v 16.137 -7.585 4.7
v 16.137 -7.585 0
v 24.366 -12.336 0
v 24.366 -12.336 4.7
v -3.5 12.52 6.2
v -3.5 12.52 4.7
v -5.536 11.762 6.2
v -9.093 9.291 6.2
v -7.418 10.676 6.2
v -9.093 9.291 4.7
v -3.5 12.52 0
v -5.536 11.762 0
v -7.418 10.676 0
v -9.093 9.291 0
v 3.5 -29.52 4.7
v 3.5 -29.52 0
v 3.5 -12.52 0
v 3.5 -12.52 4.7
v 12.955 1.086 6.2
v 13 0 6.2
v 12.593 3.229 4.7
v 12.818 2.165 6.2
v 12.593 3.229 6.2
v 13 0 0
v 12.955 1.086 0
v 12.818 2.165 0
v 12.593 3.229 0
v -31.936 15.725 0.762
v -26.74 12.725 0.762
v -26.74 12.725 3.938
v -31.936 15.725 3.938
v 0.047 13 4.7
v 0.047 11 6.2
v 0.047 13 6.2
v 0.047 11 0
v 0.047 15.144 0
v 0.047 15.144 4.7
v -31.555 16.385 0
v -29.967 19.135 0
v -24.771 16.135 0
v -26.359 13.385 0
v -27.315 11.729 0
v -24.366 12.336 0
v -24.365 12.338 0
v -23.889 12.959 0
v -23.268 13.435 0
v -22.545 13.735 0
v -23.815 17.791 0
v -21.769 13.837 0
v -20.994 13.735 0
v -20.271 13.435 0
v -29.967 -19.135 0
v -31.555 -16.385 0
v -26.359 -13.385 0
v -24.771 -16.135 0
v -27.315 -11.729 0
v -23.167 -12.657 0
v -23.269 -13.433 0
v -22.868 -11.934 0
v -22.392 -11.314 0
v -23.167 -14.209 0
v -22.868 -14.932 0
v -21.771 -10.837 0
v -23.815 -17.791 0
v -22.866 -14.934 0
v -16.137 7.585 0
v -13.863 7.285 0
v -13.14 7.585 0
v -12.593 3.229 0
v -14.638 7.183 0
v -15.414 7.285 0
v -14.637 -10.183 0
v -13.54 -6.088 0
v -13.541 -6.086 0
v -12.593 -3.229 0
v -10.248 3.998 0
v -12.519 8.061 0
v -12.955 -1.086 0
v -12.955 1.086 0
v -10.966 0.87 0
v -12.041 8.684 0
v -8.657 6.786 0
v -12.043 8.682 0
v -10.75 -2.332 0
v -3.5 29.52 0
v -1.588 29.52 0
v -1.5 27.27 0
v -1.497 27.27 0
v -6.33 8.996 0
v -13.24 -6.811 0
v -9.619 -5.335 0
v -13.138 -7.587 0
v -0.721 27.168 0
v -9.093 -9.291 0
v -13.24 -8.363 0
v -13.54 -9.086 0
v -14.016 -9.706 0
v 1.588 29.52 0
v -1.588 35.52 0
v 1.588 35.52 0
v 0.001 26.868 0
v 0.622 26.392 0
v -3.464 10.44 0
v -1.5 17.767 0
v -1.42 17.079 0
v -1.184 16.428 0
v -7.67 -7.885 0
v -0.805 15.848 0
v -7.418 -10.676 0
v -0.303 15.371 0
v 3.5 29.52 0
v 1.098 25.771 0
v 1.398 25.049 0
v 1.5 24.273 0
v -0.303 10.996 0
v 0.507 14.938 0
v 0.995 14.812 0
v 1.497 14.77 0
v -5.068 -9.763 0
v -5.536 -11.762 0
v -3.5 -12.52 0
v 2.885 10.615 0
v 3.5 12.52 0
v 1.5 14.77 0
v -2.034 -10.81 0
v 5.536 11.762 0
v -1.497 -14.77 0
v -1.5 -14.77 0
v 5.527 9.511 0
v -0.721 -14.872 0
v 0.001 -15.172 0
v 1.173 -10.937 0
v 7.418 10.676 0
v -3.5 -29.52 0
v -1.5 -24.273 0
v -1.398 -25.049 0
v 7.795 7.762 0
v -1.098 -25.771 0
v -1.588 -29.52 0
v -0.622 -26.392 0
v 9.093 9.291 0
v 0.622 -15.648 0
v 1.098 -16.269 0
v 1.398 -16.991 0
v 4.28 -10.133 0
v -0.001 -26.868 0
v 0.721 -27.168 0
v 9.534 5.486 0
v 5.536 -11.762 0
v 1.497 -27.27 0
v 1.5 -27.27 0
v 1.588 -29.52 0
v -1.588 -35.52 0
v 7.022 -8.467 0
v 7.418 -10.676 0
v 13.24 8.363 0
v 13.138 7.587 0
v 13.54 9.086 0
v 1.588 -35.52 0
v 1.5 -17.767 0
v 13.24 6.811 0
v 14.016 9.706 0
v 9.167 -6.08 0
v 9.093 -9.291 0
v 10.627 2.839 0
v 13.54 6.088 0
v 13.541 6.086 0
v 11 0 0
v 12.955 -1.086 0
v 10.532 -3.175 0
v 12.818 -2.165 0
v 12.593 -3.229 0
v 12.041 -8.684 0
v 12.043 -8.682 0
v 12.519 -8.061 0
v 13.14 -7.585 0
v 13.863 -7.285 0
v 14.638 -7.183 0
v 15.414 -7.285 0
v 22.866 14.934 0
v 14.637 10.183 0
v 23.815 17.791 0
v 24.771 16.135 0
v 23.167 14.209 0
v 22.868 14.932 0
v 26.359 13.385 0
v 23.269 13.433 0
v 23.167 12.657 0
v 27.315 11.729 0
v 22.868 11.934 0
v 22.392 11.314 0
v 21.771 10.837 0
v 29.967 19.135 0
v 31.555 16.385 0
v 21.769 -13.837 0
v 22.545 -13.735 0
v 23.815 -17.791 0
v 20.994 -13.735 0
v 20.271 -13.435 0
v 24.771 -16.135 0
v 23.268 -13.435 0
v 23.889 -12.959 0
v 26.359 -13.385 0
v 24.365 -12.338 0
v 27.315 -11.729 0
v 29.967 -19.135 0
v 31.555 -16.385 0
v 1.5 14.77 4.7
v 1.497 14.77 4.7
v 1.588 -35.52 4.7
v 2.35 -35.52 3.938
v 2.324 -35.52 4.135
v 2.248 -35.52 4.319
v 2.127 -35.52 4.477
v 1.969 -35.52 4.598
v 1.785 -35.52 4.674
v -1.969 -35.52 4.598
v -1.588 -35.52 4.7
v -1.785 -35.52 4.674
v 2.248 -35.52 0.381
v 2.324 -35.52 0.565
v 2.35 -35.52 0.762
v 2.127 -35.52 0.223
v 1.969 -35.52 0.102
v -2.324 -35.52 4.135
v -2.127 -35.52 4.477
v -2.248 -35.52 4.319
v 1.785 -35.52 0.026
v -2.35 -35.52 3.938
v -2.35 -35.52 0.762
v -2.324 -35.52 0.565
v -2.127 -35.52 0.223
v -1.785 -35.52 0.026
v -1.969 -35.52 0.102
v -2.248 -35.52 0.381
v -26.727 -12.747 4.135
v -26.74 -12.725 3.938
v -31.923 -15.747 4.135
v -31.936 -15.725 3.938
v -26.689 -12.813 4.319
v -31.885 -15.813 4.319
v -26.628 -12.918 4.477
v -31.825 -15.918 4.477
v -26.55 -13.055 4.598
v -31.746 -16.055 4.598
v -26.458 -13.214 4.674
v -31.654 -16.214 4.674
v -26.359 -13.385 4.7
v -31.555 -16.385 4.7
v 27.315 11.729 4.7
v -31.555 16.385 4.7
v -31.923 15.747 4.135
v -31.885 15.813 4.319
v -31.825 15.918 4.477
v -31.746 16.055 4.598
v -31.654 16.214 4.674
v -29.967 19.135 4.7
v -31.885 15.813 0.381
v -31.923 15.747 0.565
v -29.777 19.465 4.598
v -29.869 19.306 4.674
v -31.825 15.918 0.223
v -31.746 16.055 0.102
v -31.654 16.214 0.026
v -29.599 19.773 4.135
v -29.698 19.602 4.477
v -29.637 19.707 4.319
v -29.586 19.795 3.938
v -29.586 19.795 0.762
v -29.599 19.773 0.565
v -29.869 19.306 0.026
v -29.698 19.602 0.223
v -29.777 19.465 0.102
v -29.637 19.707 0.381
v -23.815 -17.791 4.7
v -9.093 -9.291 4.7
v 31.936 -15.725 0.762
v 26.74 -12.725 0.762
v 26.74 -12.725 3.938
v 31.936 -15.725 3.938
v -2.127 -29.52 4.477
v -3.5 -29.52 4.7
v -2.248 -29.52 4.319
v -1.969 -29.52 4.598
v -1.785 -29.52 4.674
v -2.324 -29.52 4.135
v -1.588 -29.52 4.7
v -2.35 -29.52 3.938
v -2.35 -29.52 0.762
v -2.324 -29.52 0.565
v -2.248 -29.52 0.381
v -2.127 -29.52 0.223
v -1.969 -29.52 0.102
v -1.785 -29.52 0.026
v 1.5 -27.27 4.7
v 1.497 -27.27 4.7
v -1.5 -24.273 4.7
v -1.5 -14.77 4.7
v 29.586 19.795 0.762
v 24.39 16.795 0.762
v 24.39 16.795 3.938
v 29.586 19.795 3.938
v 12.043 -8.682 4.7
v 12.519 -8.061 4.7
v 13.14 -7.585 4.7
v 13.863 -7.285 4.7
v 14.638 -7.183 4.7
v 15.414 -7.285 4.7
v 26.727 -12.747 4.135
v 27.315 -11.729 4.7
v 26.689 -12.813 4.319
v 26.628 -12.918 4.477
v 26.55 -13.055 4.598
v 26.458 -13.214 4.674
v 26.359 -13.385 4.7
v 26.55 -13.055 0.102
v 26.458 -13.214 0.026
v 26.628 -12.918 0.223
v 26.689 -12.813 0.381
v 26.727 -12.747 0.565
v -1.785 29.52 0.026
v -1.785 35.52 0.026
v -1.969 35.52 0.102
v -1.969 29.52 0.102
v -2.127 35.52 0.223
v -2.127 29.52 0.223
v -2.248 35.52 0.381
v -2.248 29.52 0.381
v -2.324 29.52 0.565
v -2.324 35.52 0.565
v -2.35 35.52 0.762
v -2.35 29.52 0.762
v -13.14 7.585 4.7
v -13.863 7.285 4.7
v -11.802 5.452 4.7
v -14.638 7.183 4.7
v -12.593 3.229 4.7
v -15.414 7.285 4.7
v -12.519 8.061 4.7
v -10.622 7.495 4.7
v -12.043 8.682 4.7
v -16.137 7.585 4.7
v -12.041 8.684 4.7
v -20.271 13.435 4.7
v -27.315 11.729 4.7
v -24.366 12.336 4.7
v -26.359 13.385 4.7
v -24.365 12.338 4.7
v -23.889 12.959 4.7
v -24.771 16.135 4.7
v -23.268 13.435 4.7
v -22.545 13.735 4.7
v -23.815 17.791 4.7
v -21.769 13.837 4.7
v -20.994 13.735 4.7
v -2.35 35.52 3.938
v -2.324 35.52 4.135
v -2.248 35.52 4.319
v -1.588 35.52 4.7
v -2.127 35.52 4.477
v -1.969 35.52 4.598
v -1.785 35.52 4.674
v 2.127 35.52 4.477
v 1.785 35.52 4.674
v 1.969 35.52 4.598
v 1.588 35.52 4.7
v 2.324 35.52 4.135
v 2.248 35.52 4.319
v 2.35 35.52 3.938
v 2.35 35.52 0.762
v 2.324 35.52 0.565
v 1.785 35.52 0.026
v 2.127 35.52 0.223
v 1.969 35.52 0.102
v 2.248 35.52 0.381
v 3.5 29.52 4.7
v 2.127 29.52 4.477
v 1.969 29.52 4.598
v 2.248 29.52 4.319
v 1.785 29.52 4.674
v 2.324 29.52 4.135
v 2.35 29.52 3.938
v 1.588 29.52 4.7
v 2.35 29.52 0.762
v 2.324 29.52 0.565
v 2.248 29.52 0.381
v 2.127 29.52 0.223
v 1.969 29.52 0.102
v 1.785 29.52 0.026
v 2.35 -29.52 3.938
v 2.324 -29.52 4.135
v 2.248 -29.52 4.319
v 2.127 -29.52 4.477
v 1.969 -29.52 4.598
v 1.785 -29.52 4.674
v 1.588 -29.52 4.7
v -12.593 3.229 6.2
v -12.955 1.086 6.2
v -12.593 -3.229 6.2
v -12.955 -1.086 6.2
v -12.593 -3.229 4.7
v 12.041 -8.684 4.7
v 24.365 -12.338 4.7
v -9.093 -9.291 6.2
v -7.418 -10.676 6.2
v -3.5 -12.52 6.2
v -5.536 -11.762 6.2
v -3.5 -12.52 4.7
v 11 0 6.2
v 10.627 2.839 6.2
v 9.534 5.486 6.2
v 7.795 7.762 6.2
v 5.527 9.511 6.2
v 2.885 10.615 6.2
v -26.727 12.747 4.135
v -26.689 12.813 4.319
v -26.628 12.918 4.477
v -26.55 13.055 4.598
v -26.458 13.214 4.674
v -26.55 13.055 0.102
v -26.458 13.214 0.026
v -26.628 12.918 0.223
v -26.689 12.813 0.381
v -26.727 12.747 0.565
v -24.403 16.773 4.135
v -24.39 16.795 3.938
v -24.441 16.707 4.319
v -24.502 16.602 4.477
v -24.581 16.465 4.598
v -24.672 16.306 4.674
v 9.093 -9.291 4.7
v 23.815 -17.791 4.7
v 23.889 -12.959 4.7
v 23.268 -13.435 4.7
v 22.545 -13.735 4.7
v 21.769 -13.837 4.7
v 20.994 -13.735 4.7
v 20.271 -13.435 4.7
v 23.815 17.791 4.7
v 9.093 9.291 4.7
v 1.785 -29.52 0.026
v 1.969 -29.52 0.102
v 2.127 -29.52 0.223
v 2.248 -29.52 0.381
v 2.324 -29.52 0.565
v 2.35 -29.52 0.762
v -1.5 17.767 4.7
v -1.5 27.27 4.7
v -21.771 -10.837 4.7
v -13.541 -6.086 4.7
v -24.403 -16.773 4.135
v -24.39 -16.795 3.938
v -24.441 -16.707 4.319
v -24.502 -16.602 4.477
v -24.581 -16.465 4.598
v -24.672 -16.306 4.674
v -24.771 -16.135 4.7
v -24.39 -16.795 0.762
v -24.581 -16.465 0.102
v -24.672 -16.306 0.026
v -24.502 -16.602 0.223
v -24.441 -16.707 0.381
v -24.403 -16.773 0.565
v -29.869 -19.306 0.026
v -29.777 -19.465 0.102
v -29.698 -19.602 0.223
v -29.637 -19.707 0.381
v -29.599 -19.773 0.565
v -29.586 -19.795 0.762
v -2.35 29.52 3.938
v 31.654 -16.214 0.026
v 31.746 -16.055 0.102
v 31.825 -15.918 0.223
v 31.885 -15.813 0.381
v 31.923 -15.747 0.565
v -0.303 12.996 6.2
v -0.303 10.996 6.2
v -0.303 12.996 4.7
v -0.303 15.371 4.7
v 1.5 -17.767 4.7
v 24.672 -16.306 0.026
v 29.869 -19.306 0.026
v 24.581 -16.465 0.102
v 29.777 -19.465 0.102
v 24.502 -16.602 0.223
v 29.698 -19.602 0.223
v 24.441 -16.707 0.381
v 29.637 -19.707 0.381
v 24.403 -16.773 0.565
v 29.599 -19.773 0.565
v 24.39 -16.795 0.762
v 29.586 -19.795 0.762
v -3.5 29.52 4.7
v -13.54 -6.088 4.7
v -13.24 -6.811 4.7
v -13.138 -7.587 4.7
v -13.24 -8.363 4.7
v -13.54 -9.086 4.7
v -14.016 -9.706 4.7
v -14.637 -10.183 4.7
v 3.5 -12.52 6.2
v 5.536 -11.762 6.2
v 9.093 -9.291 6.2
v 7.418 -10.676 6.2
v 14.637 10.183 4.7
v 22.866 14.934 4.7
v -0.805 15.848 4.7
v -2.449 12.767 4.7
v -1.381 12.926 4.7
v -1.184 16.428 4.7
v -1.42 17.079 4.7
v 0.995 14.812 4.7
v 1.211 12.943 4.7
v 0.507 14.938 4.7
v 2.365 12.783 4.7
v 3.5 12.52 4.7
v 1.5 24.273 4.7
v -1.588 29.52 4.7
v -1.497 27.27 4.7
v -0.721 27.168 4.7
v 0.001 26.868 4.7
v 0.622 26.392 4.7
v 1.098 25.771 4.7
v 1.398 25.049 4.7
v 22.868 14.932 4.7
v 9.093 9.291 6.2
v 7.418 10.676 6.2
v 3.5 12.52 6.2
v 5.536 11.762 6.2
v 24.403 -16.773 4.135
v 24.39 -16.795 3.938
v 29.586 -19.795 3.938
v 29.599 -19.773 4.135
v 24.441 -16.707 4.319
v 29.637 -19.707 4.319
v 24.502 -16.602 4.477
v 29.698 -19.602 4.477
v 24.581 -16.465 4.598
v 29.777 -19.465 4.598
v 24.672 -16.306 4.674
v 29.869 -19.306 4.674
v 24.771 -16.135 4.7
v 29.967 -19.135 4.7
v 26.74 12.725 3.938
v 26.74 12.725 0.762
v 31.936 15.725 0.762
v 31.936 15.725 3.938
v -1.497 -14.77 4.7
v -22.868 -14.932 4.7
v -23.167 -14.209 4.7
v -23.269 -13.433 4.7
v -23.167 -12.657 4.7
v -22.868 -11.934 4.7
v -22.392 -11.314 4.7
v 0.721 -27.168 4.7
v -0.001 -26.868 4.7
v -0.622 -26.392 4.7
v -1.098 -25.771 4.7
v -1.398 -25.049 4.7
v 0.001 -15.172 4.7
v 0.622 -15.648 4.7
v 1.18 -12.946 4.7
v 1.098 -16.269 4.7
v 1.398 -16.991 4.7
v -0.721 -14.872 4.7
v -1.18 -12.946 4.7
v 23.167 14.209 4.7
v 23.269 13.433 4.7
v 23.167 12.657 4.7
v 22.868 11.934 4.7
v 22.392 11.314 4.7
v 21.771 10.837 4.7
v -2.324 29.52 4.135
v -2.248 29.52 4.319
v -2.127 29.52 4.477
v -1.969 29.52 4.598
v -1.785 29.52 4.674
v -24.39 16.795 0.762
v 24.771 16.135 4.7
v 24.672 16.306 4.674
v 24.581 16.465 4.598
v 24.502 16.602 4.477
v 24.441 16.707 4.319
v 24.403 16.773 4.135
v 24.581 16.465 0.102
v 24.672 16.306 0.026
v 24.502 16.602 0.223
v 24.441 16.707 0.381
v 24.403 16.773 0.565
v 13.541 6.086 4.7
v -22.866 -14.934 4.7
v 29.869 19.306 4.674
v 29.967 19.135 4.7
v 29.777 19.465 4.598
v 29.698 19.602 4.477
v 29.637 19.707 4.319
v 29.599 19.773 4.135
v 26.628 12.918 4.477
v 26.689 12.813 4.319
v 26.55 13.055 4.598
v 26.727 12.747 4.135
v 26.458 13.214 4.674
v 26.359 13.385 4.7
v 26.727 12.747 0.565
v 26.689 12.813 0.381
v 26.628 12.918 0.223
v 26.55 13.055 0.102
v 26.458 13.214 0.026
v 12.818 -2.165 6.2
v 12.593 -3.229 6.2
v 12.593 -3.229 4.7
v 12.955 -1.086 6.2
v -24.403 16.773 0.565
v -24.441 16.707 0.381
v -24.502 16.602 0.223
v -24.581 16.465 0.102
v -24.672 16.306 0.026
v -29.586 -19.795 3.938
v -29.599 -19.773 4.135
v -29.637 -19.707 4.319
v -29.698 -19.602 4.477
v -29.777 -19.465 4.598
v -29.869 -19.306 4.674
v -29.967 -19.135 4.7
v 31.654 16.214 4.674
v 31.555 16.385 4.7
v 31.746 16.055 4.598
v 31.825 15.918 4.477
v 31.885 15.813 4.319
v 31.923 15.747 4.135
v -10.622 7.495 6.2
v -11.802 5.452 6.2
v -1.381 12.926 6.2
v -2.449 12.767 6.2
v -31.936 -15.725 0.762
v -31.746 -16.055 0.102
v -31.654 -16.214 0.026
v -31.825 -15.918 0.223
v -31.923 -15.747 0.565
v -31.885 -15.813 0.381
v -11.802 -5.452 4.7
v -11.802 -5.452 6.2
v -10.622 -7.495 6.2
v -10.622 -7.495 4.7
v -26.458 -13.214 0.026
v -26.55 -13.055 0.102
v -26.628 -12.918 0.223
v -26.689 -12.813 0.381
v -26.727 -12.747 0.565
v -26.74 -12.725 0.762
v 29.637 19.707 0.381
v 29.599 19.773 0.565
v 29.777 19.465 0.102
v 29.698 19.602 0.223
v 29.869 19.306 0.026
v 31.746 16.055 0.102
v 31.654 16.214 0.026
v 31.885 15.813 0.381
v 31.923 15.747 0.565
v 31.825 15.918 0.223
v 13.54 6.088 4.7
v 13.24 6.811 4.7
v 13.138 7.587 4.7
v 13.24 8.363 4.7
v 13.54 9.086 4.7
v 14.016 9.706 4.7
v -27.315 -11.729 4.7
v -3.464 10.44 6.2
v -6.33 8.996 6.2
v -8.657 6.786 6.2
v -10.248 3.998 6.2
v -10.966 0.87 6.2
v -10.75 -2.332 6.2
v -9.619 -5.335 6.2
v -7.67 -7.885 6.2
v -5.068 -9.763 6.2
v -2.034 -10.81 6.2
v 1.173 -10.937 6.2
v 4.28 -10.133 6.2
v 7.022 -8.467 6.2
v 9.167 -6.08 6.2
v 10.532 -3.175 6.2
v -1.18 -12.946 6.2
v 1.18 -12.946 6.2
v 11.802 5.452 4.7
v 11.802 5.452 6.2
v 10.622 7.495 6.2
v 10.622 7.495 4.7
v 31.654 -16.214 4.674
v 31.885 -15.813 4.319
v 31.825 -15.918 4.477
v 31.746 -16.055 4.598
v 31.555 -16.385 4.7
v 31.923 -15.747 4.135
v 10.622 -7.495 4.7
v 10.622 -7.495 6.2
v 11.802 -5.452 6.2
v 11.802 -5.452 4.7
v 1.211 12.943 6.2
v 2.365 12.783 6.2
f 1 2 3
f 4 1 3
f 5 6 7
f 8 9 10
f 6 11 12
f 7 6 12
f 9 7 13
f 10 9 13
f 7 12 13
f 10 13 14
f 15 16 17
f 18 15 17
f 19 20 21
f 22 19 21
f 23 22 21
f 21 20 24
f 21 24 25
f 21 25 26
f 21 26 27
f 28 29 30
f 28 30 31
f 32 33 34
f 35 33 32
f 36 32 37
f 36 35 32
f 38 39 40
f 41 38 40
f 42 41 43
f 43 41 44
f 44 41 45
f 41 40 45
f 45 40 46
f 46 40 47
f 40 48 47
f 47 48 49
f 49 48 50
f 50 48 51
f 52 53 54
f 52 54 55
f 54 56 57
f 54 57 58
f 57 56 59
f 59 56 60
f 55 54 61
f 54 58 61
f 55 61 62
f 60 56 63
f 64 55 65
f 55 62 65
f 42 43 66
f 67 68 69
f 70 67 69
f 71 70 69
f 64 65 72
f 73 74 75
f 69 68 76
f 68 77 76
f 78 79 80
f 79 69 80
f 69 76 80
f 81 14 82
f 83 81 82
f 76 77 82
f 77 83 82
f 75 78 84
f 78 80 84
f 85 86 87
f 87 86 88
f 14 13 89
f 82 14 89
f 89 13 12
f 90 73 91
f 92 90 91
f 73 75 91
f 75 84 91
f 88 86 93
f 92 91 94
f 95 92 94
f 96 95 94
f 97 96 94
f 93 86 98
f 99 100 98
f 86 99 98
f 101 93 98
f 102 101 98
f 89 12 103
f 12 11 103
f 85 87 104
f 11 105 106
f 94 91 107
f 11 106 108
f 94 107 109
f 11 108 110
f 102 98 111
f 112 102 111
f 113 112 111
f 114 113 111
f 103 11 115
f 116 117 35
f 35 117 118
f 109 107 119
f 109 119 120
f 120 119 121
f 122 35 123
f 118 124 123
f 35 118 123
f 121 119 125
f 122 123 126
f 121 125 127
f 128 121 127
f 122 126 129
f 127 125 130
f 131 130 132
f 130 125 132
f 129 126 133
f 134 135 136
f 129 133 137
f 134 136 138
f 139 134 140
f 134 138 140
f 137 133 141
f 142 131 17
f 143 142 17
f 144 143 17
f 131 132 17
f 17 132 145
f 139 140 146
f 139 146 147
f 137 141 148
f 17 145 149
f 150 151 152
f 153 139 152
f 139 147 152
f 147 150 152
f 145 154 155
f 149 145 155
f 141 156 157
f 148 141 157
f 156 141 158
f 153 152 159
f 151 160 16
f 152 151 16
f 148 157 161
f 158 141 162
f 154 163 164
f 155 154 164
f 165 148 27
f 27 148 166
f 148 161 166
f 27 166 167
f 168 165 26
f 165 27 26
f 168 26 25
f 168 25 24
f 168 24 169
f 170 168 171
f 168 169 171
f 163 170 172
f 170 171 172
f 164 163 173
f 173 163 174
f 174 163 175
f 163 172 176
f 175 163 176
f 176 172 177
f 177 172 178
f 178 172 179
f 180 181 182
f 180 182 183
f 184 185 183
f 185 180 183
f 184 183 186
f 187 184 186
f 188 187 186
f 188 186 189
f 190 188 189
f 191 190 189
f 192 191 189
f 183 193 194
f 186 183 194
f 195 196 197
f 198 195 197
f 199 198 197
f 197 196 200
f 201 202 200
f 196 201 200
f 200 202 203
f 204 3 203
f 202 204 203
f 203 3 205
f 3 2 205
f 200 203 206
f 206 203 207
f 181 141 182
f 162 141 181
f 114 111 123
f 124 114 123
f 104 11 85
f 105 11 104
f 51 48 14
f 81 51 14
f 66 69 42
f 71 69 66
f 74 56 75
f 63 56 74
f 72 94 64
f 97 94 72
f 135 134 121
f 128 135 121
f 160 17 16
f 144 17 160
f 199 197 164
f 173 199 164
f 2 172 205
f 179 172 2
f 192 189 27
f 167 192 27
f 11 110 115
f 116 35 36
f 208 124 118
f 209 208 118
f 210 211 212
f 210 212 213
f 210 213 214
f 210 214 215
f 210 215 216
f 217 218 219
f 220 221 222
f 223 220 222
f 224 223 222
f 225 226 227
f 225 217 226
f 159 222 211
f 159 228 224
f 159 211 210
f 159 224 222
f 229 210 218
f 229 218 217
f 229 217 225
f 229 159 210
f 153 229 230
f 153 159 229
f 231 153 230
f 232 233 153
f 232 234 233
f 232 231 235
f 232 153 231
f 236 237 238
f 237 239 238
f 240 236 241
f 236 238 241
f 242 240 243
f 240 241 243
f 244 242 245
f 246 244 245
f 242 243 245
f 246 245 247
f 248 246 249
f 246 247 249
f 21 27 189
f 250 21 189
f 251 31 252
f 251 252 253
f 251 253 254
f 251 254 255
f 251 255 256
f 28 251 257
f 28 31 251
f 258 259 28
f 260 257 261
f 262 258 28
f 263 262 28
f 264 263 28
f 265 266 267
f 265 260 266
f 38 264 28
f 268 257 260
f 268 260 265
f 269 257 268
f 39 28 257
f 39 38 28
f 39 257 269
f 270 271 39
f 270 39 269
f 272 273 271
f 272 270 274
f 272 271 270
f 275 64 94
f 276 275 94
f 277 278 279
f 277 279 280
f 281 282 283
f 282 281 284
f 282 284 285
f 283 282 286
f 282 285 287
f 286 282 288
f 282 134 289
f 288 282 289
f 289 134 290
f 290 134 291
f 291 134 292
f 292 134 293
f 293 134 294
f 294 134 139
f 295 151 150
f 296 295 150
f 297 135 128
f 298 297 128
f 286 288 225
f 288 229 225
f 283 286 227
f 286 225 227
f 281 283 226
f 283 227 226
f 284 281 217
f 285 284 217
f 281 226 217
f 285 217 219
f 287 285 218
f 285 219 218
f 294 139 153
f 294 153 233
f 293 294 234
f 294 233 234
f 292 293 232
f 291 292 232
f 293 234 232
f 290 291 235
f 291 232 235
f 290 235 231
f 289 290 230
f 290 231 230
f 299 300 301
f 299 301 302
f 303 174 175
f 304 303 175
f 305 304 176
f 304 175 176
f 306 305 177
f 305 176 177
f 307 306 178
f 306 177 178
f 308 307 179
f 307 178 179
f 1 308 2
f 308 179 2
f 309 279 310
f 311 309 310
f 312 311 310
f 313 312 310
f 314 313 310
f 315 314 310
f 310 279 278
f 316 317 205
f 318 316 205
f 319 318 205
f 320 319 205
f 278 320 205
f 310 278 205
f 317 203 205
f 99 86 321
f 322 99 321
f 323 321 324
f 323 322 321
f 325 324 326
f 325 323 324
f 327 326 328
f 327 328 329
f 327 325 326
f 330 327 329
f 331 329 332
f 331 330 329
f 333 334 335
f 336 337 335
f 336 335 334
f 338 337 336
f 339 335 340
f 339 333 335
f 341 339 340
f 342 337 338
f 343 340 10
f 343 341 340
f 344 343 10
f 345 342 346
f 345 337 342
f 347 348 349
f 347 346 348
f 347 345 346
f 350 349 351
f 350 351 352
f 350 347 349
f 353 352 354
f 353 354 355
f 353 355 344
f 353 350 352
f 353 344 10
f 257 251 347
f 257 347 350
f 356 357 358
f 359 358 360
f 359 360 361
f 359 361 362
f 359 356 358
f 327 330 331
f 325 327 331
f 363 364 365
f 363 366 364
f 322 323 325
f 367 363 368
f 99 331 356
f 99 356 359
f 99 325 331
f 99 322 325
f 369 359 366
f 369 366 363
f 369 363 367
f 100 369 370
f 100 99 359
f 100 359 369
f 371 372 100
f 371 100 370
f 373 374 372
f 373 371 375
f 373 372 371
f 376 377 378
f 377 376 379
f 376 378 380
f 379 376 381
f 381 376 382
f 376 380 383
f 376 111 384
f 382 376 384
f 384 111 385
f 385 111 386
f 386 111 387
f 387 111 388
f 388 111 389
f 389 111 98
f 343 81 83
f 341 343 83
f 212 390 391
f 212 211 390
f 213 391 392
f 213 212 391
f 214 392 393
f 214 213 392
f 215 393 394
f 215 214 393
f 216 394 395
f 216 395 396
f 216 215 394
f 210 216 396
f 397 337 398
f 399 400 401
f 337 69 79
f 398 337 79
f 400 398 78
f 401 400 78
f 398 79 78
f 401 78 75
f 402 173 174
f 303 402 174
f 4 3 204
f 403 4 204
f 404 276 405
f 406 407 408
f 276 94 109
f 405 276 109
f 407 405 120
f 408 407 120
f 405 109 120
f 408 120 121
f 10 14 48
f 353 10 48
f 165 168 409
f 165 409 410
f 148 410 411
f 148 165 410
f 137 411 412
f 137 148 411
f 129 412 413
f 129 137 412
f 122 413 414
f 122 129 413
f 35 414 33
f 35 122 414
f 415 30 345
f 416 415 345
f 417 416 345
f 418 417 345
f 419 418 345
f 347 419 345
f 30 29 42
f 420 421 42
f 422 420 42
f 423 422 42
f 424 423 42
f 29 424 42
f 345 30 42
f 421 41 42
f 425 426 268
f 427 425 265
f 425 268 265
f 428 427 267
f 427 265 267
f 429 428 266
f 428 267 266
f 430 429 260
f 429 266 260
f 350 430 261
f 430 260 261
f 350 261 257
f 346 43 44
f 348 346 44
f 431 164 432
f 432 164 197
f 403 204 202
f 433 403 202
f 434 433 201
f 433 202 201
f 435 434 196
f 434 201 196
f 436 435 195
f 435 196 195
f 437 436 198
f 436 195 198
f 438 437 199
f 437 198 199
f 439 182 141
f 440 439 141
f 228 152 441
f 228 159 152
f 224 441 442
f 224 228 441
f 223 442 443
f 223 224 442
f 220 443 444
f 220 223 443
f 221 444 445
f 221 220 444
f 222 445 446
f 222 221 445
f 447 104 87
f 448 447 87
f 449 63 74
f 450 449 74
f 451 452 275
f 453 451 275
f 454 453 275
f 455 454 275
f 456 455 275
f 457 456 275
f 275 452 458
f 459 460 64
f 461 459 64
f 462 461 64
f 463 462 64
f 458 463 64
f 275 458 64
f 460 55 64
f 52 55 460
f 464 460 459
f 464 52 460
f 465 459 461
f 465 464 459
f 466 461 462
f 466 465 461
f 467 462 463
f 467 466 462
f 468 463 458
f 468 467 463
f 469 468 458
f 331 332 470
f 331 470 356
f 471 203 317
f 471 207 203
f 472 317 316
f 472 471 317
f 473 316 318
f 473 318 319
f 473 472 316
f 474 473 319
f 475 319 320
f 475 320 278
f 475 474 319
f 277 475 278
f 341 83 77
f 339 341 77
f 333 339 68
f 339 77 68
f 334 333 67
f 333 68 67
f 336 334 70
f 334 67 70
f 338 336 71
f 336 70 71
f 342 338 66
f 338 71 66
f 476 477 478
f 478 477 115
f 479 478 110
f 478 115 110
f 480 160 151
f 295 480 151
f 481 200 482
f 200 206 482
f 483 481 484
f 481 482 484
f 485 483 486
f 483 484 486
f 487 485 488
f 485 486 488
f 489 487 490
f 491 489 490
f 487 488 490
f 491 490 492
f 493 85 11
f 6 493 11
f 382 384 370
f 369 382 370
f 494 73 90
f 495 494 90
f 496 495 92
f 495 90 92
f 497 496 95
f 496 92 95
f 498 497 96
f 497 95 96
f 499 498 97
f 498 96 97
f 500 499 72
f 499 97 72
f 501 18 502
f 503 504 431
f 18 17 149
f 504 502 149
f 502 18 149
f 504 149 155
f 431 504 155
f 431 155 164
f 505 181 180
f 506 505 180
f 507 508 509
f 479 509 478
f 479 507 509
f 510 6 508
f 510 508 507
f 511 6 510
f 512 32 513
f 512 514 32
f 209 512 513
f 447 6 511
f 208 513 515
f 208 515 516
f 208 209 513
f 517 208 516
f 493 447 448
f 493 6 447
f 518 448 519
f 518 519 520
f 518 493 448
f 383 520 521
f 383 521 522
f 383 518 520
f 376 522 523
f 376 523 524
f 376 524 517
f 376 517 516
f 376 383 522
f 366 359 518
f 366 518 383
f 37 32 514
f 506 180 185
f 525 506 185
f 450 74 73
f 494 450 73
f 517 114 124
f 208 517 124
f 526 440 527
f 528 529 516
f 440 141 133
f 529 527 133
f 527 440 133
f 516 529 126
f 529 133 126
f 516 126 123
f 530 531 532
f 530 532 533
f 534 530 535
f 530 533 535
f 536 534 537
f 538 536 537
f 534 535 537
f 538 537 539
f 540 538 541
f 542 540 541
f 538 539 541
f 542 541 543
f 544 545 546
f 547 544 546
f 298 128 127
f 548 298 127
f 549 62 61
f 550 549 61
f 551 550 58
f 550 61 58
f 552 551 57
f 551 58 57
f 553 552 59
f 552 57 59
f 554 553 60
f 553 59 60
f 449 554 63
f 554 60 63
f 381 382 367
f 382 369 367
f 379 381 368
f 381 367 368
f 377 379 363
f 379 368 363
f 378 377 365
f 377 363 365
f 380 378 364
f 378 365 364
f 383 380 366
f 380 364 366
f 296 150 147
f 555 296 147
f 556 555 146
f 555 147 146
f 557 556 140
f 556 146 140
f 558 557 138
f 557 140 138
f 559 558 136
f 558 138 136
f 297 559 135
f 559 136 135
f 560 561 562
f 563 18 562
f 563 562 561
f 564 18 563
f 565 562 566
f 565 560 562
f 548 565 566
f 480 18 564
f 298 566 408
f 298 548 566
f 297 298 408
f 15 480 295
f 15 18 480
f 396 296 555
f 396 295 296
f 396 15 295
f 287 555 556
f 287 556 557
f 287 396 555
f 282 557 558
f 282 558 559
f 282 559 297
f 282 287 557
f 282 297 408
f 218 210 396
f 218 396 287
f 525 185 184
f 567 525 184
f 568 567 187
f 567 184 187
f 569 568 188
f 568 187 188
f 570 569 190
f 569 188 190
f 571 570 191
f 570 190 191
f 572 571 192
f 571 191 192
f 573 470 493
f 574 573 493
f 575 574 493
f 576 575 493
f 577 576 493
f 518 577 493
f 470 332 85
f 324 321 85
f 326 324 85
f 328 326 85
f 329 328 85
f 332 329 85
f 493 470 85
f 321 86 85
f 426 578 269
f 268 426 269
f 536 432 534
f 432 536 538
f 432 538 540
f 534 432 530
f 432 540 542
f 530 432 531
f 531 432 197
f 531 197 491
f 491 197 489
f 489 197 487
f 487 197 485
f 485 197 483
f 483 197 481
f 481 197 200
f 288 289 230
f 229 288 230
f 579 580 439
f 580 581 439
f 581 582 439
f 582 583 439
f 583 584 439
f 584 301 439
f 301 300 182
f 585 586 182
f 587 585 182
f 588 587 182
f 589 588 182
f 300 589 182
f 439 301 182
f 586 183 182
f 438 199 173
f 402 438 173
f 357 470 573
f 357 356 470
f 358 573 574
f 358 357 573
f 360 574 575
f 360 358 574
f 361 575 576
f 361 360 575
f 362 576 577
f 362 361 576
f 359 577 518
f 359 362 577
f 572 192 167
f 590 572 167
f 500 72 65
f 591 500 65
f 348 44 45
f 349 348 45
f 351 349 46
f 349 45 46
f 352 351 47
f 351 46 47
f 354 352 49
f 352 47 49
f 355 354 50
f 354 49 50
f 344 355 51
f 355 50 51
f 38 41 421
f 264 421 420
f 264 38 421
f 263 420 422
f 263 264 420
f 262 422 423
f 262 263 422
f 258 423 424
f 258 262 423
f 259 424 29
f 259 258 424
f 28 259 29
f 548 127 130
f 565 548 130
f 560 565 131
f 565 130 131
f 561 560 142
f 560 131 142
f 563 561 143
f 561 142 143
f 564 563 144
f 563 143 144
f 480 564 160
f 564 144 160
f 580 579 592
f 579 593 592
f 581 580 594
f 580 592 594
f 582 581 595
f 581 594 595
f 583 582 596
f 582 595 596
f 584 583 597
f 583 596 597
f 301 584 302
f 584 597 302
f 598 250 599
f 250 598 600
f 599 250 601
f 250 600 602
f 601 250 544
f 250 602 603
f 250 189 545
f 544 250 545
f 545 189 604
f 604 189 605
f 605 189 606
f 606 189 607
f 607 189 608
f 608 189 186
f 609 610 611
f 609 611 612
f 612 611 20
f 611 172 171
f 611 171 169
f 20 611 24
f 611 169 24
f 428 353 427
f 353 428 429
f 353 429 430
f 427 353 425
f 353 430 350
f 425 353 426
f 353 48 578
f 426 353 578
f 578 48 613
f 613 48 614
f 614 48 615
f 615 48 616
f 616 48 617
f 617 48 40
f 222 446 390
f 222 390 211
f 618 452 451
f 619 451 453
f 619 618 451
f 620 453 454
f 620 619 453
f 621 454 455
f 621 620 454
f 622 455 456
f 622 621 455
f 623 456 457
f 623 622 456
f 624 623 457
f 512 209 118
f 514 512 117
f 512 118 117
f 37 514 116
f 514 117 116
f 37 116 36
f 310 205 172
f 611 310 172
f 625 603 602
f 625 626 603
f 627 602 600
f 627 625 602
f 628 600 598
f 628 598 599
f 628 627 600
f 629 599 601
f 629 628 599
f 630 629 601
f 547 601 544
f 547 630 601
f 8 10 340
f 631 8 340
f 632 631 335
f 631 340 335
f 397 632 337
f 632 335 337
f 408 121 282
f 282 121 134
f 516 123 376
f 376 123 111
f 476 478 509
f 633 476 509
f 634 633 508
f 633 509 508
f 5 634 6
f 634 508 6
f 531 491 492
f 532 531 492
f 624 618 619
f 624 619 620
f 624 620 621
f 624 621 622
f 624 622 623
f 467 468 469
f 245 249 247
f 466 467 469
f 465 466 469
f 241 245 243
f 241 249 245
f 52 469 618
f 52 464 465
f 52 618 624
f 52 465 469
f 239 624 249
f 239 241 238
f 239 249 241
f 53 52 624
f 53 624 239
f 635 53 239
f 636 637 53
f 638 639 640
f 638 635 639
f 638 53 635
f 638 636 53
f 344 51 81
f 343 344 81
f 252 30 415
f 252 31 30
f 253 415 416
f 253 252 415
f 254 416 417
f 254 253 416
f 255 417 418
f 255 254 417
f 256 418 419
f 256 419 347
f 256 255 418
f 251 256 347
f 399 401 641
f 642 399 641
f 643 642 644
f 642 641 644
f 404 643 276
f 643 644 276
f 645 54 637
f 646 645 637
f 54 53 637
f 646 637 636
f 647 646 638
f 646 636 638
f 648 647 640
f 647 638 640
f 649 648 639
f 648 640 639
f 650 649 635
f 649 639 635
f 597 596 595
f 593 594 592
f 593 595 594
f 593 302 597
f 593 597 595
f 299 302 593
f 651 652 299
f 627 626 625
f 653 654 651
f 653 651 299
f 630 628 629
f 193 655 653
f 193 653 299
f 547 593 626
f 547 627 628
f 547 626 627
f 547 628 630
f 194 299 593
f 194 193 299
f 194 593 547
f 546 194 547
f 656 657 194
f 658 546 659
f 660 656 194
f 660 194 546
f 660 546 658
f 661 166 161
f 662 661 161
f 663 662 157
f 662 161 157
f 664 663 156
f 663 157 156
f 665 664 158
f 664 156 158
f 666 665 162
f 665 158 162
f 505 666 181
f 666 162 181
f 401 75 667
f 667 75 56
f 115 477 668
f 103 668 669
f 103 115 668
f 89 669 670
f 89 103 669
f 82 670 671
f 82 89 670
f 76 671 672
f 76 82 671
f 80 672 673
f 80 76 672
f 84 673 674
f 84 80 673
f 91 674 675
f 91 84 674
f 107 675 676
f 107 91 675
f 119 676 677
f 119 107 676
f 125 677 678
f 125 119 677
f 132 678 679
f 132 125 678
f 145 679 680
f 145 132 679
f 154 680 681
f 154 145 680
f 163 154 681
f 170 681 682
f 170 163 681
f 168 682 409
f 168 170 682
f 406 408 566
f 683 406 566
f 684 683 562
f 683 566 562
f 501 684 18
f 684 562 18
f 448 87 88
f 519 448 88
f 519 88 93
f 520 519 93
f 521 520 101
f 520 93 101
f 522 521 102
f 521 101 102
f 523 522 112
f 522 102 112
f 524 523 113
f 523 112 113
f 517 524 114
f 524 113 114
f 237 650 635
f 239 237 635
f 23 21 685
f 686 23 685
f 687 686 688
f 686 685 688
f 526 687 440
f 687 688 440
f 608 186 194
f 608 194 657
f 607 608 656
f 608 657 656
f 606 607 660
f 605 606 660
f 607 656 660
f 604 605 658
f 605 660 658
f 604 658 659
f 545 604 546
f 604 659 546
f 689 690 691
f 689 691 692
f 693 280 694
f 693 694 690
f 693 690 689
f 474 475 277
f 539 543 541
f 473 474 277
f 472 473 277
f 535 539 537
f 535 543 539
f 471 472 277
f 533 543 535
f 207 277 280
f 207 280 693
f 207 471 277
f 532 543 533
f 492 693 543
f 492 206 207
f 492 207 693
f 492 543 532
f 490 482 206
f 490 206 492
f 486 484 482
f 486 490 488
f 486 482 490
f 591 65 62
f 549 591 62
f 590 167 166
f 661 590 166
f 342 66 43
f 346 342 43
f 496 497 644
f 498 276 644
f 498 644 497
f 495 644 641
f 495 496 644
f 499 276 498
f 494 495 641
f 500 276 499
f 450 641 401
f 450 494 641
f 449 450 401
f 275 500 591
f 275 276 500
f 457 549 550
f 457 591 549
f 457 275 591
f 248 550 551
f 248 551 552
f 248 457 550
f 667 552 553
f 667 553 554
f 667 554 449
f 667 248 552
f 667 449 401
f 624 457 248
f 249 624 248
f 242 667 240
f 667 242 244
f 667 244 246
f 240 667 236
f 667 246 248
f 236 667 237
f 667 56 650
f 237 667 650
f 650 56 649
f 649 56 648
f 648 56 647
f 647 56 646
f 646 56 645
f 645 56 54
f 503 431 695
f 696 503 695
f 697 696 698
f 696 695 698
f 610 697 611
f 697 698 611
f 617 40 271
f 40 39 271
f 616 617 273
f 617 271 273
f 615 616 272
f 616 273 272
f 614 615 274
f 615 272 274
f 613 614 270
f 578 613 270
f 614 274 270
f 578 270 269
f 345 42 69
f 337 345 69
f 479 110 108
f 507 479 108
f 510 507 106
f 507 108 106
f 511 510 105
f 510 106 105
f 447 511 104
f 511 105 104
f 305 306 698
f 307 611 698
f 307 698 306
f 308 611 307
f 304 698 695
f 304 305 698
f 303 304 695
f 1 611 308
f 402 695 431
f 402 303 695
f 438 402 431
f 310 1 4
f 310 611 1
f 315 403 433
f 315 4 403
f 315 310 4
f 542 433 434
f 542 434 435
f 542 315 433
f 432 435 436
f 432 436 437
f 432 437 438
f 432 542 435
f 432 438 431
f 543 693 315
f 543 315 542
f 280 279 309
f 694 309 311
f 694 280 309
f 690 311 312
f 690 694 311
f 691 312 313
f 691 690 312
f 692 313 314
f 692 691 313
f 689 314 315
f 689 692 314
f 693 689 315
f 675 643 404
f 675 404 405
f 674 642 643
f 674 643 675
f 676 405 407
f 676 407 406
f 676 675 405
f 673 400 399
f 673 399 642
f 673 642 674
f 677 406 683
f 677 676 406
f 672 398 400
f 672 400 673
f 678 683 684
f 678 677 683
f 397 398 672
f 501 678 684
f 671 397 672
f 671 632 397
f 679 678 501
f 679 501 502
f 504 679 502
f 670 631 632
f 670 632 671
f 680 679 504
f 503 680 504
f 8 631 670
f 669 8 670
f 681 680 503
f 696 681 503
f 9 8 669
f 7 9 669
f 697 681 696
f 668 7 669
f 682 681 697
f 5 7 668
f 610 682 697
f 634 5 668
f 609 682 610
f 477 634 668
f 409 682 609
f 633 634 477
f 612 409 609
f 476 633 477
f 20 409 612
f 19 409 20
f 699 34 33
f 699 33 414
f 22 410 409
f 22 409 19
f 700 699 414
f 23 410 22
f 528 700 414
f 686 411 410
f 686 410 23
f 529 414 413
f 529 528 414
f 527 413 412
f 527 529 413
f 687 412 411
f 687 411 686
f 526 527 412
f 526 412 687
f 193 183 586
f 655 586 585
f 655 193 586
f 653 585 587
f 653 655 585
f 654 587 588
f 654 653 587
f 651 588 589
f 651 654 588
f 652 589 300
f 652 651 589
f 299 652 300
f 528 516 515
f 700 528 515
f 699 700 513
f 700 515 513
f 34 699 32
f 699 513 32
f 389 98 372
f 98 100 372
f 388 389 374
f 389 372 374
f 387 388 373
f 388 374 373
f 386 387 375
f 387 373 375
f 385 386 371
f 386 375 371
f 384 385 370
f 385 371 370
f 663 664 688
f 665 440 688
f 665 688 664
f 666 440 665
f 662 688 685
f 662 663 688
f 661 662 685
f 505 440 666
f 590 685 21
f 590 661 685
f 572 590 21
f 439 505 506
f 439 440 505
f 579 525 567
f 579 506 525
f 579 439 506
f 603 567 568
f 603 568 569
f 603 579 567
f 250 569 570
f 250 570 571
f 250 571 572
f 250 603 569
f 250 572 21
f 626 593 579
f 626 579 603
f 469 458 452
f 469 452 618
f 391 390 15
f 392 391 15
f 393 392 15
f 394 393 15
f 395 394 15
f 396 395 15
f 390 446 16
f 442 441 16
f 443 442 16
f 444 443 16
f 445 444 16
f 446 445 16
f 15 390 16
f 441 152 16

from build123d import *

# Parameters (mm, degrees)
F0_R     = 11
F2_DEPTH = 6.2
F0_W     = 4.7
F0_H     = 6
F3_DEPTH = 4.7
F4_COUNT = 6
F1_W     = 0.3503125627
F1_H     = 4.9452893436
F5_DEPTH = 25.4
F6_R     = 0.762


with BuildPart() as f2:
    # F0 (on Top) → F2 (new body)
    with BuildSketch(Plane.XY):
        with BuildLine():
            ThreePointArc((-3.5, 12.5199840255), (-7.8581168228, -10.3561575886), (13, 0))
            ThreePointArc((13, 0), (10.3561575886, 7.8581168228), (3.5, 12.5199840255))
            ThreePointArc((3.5, 12.5199840255), (0, 13), (-3.5, 12.5199840255))
        make_face()
        Circle(F0_R, mode=Mode.SUBTRACT)
    extrude(amount=F2_DEPTH)

    # F0 (on Top) → F3 (join)
    with BuildSketch(Plane.XY):
        with BuildLine():
            ThreePointArc((-3.5, 12.5199840255), (0, 13), (3.5, 12.5199840255))
            Line((3.5, 12.5199840255), (3.5, 29.5199840255))
            Line((3.5, 29.5199840255), (2.35, 29.5199840255))
            Line((2.35, 29.5199840255), (-2.35, 29.5199840255))
            Line((-2.35, 29.5199840255), (-3.5, 29.5199840255))
            Line((-3.5, 29.5199840255), (-3.5, 12.5199840255))
        make_face()
        with BuildLine():
            Line((1.5, 24.2727840255), (1.5, 14.7699840255))
            Line((1.5, 14.7699840255), (1.4972, 14.7699840255))
            ThreePointArc((1.4972, 14.7699840255), (-0.6221404446, 15.647843581), (-1.5, 17.7671840255))
            Line((-1.5, 17.7671840255), (-1.5, 27.2699840255))
            Line((-1.5, 27.2699840255), (-1.4972, 27.2699840255))
            ThreePointArc((-1.4972, 27.2699840255), (0.6221404446, 26.3921244701), (1.5, 24.2727840255))
        make_face(mode=Mode.SUBTRACT)
        with Locations((0, 32.5199840255)):
            Rectangle(F0_W, F0_H)
    extrude(amount=F3_DEPTH)

    # F4: F2 ×6 about axis
    f4_axis = Axis((0, 0, 0), (0, 0, 1))


with BuildPart() as f2_1:
    add(f2.part)
    for i in range(1, F4_COUNT):
        add(f2.part.rotate(f4_axis, i * 360 / F4_COUNT))

    # F1 (on Top) → F5 (cut)
    with BuildSketch(Plane.XY):
        with Locations((-0.128307729, 13.028617017)):
            Rectangle(F1_W, F1_H)
    extrude(amount=F5_DEPTH, mode=Mode.SUBTRACT)

    # F6
    f6_edges = [f2_1.edges().sort_by_distance(p)[0] for p in [
        (-26.988132, -18.295152, 4.7),
        (-29.338132, -14.224832, 4.7),
        (-26.988132, -18.295152, 0),
        (-29.338132, -14.224832, 0),
        (-2.35, -32.519984, 0),
        (-2.35, -32.519984, 4.7),
        (2.35, -32.519984, 4.7),
        (2.35, -32.519984, 0),
        (26.988132, -18.295152, 4.7),
        (26.988132, -18.295152, 0),
        (29.338132, -14.224832, 4.7),
        (29.338132, -14.224832, 0),
        (29.338132, 14.224832, 4.7),
        (29.338132, 14.224832, 0),
        (26.988132, 18.295152, 4.7),
        (26.988132, 18.295152, 0),
        (2.35, 32.519984, 4.7),
        (2.35, 32.519984, 0),
        (-2.35, 32.519984, 4.7),
        (-2.35, 32.519984, 0),
        (-26.988132, 18.295152, 4.7),
        (-26.988132, 18.295152, 0),
        (-29.338132, 14.224832, 4.7),
        (-29.338132, 14.224832, 0),
    ]]
    fillet(f6_edges, radius=F6_R)


solid = f2_1.part
